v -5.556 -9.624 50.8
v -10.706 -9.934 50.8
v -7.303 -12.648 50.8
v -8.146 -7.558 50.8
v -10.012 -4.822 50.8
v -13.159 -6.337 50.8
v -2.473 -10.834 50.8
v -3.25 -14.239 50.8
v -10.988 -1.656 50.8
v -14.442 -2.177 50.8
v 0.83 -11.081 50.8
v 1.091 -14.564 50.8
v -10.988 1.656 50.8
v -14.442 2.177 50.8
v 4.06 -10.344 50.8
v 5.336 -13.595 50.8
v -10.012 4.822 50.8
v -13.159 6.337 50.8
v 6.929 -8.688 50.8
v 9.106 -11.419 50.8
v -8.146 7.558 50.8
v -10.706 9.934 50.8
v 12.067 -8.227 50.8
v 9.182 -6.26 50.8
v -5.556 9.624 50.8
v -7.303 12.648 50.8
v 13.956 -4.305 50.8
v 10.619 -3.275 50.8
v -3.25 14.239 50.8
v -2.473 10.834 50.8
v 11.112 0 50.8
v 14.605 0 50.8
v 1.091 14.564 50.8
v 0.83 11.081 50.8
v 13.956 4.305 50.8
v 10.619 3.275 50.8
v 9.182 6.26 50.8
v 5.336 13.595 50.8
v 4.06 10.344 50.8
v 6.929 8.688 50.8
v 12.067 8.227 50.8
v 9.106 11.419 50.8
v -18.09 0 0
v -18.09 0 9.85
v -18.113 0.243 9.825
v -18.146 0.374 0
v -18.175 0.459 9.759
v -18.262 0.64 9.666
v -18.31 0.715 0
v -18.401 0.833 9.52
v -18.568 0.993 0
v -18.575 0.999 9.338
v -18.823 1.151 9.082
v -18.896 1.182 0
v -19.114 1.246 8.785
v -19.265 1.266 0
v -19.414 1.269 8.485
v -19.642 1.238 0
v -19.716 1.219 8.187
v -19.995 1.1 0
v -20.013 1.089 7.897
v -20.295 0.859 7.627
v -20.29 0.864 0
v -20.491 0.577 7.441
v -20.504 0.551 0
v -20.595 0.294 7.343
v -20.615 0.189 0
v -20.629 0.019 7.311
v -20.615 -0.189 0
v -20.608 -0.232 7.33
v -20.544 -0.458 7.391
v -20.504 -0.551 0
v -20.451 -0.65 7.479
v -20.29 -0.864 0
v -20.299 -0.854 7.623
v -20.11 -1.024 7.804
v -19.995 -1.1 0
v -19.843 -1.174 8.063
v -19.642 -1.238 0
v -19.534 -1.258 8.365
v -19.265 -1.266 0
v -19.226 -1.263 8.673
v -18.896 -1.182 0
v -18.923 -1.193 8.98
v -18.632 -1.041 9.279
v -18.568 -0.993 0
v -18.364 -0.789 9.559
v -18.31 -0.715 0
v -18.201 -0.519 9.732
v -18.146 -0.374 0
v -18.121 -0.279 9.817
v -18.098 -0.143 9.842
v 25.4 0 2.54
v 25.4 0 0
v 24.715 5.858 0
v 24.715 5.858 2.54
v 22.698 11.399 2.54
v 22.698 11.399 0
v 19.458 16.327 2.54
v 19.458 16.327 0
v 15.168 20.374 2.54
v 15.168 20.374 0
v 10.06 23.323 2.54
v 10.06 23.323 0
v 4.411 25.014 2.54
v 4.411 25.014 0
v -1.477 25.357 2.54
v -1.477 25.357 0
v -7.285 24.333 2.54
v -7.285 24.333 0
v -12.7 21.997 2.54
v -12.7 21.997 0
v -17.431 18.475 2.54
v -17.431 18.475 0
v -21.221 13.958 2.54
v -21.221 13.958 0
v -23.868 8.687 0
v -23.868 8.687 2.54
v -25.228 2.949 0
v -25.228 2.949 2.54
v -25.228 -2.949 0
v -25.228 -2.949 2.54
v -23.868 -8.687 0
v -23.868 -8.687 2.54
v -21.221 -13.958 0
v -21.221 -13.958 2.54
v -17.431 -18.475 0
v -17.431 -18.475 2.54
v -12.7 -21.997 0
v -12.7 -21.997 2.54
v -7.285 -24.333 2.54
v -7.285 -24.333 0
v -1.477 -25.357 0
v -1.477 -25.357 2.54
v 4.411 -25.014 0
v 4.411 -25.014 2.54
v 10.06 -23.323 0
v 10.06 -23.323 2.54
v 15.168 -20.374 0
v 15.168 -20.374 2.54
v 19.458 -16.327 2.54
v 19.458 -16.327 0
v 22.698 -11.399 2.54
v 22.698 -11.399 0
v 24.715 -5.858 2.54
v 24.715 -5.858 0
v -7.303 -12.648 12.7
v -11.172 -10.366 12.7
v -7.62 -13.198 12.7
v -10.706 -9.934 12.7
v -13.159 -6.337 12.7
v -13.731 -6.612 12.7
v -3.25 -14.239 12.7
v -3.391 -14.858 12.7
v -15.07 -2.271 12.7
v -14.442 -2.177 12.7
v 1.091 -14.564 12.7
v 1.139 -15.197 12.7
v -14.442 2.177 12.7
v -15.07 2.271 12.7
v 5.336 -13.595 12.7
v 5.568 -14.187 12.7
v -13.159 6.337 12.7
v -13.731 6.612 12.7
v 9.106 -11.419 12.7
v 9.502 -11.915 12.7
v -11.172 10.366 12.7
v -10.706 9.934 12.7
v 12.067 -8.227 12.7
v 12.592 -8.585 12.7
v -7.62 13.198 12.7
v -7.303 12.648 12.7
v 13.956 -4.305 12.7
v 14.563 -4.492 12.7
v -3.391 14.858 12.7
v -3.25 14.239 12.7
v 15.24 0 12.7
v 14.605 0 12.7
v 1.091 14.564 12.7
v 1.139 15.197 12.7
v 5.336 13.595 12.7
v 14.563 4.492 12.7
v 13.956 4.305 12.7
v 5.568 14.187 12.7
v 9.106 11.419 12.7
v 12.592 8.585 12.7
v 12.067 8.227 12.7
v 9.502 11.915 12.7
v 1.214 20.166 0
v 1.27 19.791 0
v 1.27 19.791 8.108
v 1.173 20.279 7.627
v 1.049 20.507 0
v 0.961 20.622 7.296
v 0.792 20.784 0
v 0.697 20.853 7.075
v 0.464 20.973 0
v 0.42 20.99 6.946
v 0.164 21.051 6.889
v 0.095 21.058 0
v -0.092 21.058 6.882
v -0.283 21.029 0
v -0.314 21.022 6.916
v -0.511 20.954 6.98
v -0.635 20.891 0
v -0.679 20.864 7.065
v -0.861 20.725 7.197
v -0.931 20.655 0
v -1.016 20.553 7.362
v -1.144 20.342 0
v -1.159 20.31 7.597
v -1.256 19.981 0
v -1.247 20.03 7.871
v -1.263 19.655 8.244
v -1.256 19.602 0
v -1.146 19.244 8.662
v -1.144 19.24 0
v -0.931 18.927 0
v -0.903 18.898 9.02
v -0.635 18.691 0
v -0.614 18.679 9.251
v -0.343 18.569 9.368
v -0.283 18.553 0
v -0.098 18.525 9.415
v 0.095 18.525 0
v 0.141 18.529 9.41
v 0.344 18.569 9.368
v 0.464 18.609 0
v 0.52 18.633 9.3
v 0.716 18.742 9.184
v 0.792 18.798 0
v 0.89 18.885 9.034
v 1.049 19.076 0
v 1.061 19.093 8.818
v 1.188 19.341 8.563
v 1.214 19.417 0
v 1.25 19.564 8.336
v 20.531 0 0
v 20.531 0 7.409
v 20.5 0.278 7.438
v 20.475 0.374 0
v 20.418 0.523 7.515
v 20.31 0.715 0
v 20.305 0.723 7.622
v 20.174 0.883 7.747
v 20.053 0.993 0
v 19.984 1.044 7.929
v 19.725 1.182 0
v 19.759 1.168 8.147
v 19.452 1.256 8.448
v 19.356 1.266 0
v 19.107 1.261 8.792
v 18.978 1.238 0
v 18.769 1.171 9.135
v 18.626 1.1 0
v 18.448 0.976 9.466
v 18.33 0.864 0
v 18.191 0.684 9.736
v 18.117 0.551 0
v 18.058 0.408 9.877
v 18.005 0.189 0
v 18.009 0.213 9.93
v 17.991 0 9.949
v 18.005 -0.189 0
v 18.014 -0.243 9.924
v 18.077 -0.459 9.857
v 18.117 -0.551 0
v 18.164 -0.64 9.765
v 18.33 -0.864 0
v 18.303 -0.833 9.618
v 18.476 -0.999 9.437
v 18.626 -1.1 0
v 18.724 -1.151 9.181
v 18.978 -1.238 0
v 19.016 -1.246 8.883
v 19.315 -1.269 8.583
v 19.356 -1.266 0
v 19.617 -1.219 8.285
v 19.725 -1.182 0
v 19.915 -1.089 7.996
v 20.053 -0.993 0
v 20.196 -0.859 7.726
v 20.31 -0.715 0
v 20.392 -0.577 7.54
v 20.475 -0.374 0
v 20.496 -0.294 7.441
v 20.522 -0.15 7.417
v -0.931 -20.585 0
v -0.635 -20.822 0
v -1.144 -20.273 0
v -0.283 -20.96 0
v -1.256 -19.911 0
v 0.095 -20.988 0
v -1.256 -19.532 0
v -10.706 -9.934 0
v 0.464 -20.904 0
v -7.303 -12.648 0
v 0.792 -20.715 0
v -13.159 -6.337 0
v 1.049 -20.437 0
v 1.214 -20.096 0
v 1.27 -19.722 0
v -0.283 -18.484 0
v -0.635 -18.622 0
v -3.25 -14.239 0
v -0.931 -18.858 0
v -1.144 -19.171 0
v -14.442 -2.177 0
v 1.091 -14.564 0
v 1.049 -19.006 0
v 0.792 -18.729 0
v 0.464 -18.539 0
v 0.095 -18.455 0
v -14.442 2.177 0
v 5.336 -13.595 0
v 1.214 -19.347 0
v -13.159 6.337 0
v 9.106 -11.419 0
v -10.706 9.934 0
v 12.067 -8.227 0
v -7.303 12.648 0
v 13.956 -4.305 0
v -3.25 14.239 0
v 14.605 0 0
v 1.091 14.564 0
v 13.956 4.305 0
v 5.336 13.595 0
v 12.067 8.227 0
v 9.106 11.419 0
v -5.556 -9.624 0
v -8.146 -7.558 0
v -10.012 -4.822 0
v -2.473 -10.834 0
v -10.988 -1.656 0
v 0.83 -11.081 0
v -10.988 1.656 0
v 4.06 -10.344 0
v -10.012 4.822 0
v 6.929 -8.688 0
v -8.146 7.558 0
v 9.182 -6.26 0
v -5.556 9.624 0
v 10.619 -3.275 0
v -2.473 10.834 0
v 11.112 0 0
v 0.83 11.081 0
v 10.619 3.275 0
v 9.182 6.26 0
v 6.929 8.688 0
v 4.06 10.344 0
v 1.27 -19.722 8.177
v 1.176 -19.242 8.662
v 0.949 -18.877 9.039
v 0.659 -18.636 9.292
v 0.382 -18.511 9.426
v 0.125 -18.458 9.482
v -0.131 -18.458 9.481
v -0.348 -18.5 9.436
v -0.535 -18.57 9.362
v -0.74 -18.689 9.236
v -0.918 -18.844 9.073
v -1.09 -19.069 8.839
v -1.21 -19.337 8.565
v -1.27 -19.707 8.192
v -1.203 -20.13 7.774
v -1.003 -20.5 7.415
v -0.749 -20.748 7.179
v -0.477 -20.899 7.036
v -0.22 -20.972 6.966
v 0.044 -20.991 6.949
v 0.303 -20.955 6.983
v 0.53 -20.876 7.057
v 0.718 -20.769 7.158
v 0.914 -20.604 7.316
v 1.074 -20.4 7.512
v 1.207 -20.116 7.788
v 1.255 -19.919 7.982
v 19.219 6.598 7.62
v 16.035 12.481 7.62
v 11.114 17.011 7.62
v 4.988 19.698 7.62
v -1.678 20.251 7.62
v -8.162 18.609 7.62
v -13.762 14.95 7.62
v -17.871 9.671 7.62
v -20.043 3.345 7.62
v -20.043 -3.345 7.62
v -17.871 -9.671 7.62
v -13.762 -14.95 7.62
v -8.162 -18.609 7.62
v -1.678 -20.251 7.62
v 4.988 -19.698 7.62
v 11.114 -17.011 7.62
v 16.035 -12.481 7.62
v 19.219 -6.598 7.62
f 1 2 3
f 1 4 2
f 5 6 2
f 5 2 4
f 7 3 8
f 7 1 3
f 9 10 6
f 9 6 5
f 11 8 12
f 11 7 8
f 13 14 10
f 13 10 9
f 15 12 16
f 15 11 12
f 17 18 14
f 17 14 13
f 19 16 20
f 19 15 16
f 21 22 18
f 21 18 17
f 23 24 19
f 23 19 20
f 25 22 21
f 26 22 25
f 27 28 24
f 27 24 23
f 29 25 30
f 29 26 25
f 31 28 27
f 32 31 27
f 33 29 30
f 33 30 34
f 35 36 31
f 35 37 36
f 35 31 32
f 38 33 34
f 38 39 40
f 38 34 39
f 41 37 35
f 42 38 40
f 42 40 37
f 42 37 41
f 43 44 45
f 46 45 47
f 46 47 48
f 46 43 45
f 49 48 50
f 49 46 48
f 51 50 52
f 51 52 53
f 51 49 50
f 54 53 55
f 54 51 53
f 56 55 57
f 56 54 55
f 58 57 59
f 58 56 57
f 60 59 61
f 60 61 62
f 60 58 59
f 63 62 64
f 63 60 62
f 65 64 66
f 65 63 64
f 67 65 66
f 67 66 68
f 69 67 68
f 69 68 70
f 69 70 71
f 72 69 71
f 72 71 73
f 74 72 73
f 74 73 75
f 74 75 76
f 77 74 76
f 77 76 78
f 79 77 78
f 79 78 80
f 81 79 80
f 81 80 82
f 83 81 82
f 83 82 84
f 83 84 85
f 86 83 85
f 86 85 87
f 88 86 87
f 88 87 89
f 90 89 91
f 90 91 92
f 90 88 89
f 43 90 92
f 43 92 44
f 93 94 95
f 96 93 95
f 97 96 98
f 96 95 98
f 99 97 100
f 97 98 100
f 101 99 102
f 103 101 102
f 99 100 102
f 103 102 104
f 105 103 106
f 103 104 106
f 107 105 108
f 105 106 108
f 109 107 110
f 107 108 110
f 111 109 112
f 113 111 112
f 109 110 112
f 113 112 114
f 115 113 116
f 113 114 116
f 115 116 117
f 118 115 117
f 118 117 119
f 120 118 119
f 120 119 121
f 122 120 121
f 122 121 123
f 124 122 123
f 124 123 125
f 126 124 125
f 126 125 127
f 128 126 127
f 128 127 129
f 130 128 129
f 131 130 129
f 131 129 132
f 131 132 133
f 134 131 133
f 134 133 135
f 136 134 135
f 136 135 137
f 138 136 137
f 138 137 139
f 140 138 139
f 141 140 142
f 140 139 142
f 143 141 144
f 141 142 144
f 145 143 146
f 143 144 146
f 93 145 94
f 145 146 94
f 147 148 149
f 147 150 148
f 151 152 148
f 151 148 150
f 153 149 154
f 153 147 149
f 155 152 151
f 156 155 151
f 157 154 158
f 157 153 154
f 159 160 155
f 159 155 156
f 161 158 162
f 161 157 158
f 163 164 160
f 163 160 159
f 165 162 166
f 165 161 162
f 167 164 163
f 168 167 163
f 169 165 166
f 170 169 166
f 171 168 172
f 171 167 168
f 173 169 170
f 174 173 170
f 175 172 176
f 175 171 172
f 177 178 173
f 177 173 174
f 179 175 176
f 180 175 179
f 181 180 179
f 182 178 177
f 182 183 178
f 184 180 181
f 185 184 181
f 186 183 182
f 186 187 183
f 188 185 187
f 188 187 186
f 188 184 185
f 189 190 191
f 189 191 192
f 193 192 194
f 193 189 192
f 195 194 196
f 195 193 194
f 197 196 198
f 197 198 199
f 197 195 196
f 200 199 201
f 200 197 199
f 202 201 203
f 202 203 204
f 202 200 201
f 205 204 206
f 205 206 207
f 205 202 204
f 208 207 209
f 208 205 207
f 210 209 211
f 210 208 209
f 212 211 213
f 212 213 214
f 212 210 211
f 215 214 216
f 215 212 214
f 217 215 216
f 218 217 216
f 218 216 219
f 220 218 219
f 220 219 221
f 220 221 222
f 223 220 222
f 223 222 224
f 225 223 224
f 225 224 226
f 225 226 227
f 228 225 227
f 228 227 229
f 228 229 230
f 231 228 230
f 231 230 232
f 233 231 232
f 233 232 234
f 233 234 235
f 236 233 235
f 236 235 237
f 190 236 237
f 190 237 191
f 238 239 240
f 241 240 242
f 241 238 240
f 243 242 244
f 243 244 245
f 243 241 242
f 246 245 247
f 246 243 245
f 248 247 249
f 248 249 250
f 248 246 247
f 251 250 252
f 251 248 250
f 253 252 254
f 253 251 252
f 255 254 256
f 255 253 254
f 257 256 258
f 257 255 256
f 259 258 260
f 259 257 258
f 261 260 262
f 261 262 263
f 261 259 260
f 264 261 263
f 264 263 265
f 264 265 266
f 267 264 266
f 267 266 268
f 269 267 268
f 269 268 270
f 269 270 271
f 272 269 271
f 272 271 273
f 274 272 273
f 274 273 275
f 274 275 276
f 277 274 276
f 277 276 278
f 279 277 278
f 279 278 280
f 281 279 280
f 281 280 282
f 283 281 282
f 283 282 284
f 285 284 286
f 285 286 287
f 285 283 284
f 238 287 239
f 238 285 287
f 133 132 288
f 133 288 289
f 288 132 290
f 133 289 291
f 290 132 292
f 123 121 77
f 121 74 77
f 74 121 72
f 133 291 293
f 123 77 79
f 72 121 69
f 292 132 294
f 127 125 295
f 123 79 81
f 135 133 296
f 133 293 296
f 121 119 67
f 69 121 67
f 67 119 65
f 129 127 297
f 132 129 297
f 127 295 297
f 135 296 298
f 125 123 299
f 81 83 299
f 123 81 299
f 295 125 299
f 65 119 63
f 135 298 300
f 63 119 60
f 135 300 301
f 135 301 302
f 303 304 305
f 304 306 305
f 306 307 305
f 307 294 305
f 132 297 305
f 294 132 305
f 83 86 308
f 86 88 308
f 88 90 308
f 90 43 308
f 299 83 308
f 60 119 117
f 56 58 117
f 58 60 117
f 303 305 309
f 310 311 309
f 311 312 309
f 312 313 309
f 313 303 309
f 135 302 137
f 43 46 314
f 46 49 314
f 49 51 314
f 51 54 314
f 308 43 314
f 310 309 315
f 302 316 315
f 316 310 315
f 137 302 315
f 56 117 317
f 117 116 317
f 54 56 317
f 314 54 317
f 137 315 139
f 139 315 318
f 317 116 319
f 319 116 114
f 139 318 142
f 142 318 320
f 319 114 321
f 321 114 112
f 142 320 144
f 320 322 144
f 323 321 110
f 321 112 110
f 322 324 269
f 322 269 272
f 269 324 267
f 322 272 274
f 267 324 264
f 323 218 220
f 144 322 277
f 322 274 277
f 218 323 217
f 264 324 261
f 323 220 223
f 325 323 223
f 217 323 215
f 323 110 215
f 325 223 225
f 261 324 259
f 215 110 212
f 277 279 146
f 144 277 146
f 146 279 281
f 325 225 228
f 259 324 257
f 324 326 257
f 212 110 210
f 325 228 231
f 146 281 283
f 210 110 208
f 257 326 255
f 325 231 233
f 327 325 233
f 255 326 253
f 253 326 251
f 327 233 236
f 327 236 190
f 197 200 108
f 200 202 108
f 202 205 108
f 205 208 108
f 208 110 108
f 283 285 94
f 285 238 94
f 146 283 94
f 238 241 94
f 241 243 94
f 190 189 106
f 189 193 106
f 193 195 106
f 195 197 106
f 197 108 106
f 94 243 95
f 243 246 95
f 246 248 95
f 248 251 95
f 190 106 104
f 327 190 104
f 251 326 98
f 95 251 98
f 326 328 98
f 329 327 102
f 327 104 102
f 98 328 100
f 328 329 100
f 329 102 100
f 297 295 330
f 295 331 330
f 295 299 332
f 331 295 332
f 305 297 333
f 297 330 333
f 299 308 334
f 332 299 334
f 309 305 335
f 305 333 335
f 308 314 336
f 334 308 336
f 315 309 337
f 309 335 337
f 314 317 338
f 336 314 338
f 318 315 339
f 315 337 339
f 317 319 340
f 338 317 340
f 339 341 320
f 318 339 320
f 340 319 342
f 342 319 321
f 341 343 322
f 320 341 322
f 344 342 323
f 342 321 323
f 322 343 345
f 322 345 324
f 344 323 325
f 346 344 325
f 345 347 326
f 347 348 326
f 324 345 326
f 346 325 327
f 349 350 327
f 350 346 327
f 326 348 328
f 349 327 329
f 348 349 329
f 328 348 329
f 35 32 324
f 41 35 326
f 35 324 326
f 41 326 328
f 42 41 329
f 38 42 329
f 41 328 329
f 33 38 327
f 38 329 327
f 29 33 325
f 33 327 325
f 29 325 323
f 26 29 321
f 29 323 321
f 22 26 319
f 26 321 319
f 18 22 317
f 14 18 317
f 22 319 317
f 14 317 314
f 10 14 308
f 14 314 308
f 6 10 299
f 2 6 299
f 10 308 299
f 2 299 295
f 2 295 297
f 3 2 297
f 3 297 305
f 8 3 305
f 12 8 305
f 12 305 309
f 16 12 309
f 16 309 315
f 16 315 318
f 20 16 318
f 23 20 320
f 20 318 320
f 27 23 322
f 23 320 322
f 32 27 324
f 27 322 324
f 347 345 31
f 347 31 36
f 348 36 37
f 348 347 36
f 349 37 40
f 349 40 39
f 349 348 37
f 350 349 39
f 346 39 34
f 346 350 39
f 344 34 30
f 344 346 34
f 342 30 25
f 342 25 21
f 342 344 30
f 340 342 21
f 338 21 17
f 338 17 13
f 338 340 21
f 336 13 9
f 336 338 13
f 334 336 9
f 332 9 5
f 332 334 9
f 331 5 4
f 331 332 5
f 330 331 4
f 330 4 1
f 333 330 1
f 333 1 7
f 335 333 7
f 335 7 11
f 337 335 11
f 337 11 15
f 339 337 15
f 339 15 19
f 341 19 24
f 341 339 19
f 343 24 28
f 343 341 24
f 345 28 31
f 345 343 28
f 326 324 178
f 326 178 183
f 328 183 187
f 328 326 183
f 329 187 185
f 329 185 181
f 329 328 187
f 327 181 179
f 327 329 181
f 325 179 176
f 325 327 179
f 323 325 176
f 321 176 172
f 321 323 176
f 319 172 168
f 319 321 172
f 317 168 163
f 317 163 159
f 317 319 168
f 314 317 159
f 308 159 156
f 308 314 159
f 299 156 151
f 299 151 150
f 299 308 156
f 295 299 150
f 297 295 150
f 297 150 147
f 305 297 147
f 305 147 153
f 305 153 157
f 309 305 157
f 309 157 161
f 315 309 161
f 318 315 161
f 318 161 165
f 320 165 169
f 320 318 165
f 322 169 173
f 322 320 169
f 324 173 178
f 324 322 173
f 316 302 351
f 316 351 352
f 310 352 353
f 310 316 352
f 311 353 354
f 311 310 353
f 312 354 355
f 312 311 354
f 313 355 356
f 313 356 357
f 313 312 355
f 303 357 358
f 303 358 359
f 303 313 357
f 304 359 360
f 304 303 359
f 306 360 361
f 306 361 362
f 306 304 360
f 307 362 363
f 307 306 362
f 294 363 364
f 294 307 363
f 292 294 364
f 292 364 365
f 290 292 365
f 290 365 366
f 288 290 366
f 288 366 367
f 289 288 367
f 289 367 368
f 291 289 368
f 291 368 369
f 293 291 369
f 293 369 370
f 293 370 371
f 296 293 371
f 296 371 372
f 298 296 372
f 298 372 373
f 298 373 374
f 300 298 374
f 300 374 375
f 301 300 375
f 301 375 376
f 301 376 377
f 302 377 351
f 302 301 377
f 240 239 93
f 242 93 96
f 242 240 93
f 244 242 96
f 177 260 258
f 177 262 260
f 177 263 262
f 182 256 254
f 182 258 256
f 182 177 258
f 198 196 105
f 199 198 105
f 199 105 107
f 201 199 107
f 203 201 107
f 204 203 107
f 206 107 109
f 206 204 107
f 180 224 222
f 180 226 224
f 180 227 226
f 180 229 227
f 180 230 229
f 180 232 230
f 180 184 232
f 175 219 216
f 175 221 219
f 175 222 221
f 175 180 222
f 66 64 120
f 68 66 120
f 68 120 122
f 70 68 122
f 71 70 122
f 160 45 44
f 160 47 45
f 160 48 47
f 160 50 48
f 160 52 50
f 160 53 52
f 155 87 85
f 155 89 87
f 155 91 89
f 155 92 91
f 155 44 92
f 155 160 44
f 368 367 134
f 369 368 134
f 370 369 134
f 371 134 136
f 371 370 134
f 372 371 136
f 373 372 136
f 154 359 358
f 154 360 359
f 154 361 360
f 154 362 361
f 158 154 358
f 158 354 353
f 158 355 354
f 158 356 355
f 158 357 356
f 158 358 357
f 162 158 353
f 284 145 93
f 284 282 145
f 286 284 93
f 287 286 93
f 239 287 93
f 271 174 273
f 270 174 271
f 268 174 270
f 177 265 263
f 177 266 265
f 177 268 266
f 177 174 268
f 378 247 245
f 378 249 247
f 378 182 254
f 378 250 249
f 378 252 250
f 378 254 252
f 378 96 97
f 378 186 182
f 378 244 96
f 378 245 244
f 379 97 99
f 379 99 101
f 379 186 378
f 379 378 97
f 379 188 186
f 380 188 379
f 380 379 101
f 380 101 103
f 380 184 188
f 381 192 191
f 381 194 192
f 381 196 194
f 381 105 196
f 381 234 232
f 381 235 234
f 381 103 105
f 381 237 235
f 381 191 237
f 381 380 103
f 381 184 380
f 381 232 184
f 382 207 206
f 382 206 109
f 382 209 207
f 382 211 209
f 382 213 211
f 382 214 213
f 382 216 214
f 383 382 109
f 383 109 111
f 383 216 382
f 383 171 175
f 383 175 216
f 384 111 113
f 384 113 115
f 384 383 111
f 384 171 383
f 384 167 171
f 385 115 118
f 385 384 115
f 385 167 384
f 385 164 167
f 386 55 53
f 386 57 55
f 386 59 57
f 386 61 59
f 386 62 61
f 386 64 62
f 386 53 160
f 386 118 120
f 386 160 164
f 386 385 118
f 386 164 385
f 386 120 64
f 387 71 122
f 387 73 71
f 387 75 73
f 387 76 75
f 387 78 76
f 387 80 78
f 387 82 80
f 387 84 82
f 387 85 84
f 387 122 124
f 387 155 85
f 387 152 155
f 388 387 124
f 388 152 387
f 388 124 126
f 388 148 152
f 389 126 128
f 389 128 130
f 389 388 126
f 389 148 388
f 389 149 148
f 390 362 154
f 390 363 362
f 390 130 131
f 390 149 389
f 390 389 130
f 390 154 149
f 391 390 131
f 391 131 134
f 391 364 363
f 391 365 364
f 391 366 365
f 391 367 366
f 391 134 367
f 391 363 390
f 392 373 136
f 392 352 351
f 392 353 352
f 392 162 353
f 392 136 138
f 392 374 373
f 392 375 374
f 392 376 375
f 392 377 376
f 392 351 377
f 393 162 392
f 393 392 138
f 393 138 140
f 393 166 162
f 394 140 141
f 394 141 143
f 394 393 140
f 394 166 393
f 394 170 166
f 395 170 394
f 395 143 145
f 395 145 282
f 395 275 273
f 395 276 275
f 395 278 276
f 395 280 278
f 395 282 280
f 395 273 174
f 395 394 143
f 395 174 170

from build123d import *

# Parameters (mm, degrees)
F0_R     = 25.4
F0_R_2   = 1.27
F0_R_3   = 14.605
F1_DEPTH = 12.7
F0_R_4   = 11.1125
F2_DEPTH = 50.8


# Not quite as in the source:
# - a fillet or chamfer that OpenCascade refuses, or shapes differently, is made with other operations: its cross-section is extruded or revolved along the edge and cut away or added
# - a feature of the source that left no trace in its solid (it failed there, or was rolled back) is left out


with BuildPart() as f1:
    # F0 (on Top) → F1 (new body)
    with BuildSketch(Plane.XY):
        Circle(F0_R)
        with Locations((0, -19.7216775268)):
            Circle(F0_R_2, mode=Mode.SUBTRACT)
        with Locations((-19.3595029414, 0)):
            Circle(F0_R_2, mode=Mode.SUBTRACT)
        Circle(F0_R_3, mode=Mode.SUBTRACT)
        with Locations((19.2609746009, 0)):
            Circle(F0_R_2, mode=Mode.SUBTRACT)
        with Locations((0, 19.7912380099)):
            Circle(F0_R_2, mode=Mode.SUBTRACT)
    extrude(amount=F1_DEPTH)

    # F3: chamfer of 10.16 on 1 edges, made by hand

    # F3_s1 → F3_t2 (revolve, cut)
    with BuildSketch(Plane.XZ):
        Polygon((25.4, 2.54), (15.24, 12.7), (25.4, 12.7), align=None)
    revolve(axis=Axis((0, 0, 12.7), (0, 0, 1)), mode=Mode.SUBTRACT)


with BuildPart() as f2:
    # F0 (on Top) → F2 (new body)
    with BuildSketch(Plane.XY):
        Circle(F0_R_3)
        Circle(F0_R_4, mode=Mode.SUBTRACT)
    extrude(amount=F2_DEPTH)


solid = Compound([f1.part, f2.part])
